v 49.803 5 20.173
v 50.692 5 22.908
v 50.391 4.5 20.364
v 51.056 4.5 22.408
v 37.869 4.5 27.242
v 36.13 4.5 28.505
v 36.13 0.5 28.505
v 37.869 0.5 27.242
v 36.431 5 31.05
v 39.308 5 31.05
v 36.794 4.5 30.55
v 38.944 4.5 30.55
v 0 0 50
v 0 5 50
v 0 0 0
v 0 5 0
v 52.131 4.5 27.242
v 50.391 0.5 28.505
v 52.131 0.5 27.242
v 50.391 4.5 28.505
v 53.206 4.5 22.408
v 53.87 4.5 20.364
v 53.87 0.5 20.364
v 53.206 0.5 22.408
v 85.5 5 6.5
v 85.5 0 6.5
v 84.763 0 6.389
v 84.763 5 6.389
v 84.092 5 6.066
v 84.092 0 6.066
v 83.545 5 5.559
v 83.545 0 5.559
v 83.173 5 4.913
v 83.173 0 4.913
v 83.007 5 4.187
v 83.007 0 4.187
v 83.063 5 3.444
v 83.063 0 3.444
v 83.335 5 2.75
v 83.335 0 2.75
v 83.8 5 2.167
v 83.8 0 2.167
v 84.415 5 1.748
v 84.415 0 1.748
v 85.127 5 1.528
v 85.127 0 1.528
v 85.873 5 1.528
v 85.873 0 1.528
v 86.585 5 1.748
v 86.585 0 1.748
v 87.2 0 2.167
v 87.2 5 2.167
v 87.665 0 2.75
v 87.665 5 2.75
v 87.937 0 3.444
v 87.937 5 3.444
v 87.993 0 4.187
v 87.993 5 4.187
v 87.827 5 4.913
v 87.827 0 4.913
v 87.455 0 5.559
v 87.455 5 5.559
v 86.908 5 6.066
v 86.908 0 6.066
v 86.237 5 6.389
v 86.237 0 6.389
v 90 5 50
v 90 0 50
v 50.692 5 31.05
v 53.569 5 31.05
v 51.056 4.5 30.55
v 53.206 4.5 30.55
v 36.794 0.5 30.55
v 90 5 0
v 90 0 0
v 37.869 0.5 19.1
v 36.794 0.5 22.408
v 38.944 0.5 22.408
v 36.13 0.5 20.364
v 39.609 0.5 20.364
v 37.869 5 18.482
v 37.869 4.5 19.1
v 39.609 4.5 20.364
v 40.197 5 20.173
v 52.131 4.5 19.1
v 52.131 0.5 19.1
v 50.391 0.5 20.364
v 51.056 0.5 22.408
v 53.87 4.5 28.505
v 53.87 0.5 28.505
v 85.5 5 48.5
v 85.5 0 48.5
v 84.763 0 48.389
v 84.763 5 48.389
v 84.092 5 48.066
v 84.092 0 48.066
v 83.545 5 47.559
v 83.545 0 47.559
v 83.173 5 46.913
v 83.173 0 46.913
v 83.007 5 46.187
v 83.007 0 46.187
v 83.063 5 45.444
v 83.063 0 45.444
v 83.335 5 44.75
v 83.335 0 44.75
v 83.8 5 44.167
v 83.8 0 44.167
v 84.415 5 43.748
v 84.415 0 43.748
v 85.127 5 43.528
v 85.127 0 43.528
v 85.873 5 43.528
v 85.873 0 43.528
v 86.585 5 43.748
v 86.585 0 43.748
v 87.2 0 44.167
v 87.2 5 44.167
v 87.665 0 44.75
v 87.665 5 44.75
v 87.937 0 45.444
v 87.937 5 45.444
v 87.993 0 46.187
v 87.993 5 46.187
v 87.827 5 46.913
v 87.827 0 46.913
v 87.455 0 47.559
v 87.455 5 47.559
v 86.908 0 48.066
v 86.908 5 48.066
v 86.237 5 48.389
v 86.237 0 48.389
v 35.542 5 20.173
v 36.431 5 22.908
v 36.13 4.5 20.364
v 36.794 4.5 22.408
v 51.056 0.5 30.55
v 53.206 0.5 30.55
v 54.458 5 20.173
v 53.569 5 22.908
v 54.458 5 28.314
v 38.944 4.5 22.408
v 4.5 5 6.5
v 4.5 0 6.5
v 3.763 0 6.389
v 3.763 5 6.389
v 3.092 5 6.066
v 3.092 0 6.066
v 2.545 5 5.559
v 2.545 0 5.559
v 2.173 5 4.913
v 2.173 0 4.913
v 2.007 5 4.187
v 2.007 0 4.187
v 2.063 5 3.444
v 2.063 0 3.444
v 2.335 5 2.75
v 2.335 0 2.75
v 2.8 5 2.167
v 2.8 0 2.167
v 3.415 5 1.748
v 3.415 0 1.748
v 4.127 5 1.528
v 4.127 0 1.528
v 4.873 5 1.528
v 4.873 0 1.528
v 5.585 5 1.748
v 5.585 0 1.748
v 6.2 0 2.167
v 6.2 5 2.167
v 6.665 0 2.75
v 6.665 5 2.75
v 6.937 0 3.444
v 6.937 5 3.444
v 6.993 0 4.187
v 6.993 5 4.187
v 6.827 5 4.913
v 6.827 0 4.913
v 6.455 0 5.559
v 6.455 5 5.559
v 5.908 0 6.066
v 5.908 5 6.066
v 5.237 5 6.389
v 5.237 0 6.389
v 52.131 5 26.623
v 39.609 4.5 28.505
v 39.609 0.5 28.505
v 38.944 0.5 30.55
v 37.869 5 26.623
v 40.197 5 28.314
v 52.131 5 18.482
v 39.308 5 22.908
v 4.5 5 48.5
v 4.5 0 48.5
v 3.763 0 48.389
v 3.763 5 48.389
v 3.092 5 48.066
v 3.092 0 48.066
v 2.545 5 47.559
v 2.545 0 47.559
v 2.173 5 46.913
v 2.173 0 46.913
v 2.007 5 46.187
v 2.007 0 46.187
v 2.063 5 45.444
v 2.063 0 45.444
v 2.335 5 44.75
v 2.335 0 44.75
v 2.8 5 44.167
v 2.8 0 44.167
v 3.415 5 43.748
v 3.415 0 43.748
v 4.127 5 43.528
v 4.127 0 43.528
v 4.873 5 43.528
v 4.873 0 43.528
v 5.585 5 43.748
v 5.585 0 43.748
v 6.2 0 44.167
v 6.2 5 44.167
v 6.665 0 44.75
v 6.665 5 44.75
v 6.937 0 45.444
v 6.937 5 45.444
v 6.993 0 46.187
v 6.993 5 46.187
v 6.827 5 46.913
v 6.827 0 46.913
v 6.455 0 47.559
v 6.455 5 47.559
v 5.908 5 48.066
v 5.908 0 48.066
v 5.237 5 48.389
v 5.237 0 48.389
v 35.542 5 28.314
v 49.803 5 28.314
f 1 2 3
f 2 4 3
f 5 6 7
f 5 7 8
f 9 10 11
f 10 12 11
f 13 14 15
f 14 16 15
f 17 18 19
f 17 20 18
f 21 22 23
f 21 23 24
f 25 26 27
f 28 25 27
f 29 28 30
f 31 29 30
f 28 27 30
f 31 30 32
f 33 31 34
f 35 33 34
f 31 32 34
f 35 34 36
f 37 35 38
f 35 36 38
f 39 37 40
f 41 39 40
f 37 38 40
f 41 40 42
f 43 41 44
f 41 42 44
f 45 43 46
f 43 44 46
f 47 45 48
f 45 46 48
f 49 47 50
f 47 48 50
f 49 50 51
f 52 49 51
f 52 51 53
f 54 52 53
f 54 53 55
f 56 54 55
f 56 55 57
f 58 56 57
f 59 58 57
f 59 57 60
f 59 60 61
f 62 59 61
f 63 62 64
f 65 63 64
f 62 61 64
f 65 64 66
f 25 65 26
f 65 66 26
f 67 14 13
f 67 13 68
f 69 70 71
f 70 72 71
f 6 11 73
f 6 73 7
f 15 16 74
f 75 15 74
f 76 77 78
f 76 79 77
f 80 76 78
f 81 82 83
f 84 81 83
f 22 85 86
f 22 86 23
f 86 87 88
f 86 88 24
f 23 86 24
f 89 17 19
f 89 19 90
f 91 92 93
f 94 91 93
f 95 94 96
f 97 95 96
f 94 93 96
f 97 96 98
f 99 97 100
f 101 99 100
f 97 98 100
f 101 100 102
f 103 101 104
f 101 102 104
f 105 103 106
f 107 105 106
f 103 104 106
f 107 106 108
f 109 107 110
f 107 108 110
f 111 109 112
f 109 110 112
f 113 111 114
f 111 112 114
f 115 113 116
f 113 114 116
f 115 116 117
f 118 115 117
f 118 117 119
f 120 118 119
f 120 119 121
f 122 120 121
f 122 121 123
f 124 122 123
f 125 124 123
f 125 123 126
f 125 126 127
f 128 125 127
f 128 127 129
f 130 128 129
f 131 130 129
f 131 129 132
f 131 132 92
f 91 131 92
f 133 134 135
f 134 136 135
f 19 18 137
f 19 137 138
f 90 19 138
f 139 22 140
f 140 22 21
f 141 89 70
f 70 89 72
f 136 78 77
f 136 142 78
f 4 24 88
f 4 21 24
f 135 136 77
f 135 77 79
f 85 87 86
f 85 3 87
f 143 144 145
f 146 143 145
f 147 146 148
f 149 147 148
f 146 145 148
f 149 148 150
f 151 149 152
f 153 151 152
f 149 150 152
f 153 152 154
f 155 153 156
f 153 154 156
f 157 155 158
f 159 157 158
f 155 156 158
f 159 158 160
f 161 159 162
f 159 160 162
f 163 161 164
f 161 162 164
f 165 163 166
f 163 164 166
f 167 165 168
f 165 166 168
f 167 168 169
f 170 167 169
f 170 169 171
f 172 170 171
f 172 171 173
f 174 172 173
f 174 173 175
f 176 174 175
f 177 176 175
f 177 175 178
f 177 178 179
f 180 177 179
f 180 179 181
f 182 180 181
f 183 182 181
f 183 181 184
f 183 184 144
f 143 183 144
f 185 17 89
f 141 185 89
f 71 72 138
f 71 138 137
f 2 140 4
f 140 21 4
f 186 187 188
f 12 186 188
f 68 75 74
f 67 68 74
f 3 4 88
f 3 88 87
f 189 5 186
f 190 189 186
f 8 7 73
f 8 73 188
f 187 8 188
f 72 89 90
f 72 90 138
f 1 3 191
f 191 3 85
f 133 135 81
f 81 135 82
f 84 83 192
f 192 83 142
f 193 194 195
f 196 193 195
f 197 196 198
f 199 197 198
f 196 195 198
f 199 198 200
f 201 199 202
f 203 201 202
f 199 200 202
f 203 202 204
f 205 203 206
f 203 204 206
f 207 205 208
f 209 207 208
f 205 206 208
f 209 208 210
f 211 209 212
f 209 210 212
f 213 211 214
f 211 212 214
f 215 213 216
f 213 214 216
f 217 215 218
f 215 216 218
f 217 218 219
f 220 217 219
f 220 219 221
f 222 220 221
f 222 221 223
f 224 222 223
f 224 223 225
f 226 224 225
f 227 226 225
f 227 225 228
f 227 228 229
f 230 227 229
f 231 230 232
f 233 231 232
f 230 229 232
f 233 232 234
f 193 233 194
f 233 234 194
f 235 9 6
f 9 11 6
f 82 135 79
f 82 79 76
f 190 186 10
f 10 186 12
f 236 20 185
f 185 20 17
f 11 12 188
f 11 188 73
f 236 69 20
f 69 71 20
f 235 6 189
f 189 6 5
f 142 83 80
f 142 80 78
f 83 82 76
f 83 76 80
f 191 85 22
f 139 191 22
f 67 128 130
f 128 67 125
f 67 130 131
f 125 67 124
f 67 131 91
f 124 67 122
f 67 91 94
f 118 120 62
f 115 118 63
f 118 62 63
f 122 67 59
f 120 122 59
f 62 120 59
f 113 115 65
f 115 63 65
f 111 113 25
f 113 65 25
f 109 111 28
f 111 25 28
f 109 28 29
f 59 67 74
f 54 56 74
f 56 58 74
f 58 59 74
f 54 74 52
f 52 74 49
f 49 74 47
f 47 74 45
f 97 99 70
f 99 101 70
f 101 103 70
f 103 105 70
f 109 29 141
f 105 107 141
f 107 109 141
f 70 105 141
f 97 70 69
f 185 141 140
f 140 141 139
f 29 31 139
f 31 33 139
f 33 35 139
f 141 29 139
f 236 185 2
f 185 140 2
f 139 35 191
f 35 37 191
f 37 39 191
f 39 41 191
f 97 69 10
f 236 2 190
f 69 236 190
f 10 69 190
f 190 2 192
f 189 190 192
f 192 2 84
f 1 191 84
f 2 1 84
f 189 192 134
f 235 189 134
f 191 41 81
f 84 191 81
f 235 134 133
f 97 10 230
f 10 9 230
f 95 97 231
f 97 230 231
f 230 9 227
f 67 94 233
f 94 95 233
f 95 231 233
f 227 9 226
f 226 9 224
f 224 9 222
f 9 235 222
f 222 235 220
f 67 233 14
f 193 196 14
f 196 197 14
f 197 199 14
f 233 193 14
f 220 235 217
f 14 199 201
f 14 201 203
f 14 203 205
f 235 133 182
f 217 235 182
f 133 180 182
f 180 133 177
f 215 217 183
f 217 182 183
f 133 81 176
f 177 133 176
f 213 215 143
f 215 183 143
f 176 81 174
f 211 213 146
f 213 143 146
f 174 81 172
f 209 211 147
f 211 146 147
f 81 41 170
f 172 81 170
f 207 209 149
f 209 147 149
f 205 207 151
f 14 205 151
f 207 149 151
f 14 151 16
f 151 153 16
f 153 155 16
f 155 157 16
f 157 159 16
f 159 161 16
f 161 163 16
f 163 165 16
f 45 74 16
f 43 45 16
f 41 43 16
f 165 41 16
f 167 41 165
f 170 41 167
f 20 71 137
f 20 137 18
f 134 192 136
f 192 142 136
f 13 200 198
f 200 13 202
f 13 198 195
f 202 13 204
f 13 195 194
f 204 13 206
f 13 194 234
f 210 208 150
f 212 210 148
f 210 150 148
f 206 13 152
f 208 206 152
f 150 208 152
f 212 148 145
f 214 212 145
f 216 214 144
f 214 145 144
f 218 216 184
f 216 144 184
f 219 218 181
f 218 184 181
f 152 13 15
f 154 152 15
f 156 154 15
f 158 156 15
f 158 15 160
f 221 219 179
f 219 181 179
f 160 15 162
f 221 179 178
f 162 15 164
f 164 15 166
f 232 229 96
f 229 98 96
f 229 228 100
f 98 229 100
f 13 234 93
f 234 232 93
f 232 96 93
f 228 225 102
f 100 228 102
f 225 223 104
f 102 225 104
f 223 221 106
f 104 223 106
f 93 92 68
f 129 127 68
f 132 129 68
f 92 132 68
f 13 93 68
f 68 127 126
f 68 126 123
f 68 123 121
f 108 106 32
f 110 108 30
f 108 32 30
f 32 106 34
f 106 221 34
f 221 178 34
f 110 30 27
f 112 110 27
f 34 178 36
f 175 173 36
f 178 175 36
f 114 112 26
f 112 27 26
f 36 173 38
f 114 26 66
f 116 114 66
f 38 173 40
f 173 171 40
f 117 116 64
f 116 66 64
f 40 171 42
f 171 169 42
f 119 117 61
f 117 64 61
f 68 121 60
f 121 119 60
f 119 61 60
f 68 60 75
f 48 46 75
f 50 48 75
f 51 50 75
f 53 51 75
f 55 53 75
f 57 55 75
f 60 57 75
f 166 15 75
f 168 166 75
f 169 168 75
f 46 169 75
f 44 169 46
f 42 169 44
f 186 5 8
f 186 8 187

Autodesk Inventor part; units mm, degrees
ref_plane "YZ Plane" through (0, 0, 0) normal (1, 0, 0) x (0, 1, 0)
ref_plane "XZ Plane" through (0, 0, 0) normal (0, 1, 0) x (-1, 0, 0)
ref_plane "XY Plane" through (0, 0, 0) normal (0, 0, 1) x (1, 0, 0)
sketch "Sketch1" plane through (0, 0, 0) normal (0, 0, 1) x (1, 0, 0)
  line L0 (0, 0) -> (90, 0)
  line L1 (90, 0) -> (90, 5)
  line L2 (90, 5) -> (0, 5)
  line L3 (0, 5) -> (0, 0)
  dimension "d0" = 90
  dimension "d1" = 5
extrude "Extrusion1" add sketch "Sketch1" along normal blind 50
sketch "Sketch2" plane through (0, 5, 0) normal (0, 1, 0) x (1, 0, 0)
  line L0 (90, 0) -> (0, 0) projected
  line L1 (0, 0) -> (0, -50) projected
  line L2 (90, -50) -> (0, -50) projected
  line L3 (90, 0) -> (90, -50) projected
  line L4 (35, -18) -> (55, -18)
  line L5 (55, -18) -> (55, -32)
  line L6 (55, -32) -> (35, -32)
  line L7 (35, -32) -> (35, -18)
  line L8 (53.87, -28.5052) -> (53.2056, -30.55)
  line L9 (53.2056, -30.55) -> (51.0556, -30.55)
  line L10 (51.0556, -30.55) -> (50.3912, -28.5052)
  line L11 (50.3912, -28.5052) -> (52.1306, -27.2415)
  line L12 (52.1306, -27.2415) -> (53.87, -28.5052)
  line L13 (37.8694, -27.2415) -> (39.6088, -28.5052)
  line L14 (39.6088, -28.5052) -> (38.9444, -30.55)
  line L15 (38.9444, -30.55) -> (36.7944, -30.55)
  line L16 (36.7944, -30.55) -> (36.13, -28.5052)
  line L17 (36.13, -28.5052) -> (37.8694, -27.2415)
  line L18 (37.8694, -19.1) -> (39.6088, -20.3637)
  line L19 (39.6088, -20.3637) -> (38.9444, -22.4085)
  line L20 (38.9444, -22.4085) -> (36.7944, -22.4085)
  line L21 (36.7944, -22.4085) -> (36.13, -20.3637)
  line L22 (36.13, -20.3637) -> (37.8694, -19.1)
  line L23 (52.1306, -19.1) -> (53.87, -20.3637)
  line L24 (53.87, -20.3637) -> (53.2056, -22.4085)
  line L25 (53.2056, -22.4085) -> (51.0556, -22.4085)
  line L26 (51.0556, -22.4085) -> (50.3912, -20.3637)
  line L27 (50.3912, -20.3637) -> (52.1306, -19.1)
  point P0 (52.1306, -29.0704)
  point P1 (37.8694, -29.0704)
  point P2 (37.8694, -20.9289)
  point P3 (52.1306, -20.9289)
  point P4 (52.1306, -22.4085)
  dimension "d4" = 20
  dimension "d5" = 14
  dimension "d6" = 18
  dimension "d7" = 18
  dimension "d8" = 35
  dimension "d9" = 35
  dimension "d11" = 1.13
  dimension "d12" = 1.45
  dimension "d13" = 1.45
  dimension "d15" = 1.13
  dimension "d16" = 1.13
  dimension "d17" = 1.1
  dimension "d18" = 1.1
  dimension "d19" = 1.13
  dimension "d28" = 2.15
  dimension "d29" = 2.15
  dimension "d30" = 4.833
  dimension "d31" = 2.15
  dimension "d32" = 2.15
  dimension "d33" = 4.833
extrude "Extrusion2" cut sketch "Sketch2" against normal blind 4.5 contours L8 L9 L10 L11 L12 | L13 L14 L15 L16 L17 | L18 L19 L20 L21 L22 | L23 L24 L25 L26 L27
chamfer "Chamfer1" distance 0.5 angle 45 20 edges at (36.9997, 5, 27.8734) (36.4622, 5, 29.5276) (37.8694, 5, 30.55) (39.2766, 5, 29.5276) (38.7391, 5, 27.8734) (36.9997, 5, 19.7319) (36.4622, 5, 21.3861) (37.8694, 5, 22.4085) (39.2766, 5, 21.3861) (38.7391, 5, 19.7319) (50.7234, 5, 29.5276) (51.2609, 5, 27.8734) (53.0003, 5, 27.8734) (53.5378, 5, 29.5276) (52.1306, 5, 30.55) (52.1306, 5, 22.4085) (50.7234, 5, 21.3861) (51.2609, 5, 19.7319) (53.5378, 5, 21.3861) (53.0003, 5, 19.7319)
sketch "Sketch3" plane through (0, 5, 0) normal (0, 1, 0) x (1, 0, 0)
  line L0 (90, 0) -> (0, 0) projected
  line L1 (90, -50) -> (0, -50) projected
  line L2 (90, 0) -> (90, -50) projected
  line L3 (0, 0) -> (0, -50) projected
  point P0 (4.5, -46)
  point P1 (4.5, -4)
  point P2 (85.5, -46)
  point P3 (85.5, -4)
  dimension "d46" = 4.5
  dimension "d47" = 4.5
  dimension "d48" = 4
  dimension "d49" = 4
  dimension "d57" = 4.5
  dimension "d58" = 4.5
  dimension "d59" = 4
  dimension "d60" = 4
hole "Hole2" at (4.5, 5, 46) at (4.5, 5, 4) at (85.5, 5, 4) at (85.5, 5, 46) direction (0, -1, 0) diameter 5 end through all
properties part number "Hoofdplaat onderkant"
